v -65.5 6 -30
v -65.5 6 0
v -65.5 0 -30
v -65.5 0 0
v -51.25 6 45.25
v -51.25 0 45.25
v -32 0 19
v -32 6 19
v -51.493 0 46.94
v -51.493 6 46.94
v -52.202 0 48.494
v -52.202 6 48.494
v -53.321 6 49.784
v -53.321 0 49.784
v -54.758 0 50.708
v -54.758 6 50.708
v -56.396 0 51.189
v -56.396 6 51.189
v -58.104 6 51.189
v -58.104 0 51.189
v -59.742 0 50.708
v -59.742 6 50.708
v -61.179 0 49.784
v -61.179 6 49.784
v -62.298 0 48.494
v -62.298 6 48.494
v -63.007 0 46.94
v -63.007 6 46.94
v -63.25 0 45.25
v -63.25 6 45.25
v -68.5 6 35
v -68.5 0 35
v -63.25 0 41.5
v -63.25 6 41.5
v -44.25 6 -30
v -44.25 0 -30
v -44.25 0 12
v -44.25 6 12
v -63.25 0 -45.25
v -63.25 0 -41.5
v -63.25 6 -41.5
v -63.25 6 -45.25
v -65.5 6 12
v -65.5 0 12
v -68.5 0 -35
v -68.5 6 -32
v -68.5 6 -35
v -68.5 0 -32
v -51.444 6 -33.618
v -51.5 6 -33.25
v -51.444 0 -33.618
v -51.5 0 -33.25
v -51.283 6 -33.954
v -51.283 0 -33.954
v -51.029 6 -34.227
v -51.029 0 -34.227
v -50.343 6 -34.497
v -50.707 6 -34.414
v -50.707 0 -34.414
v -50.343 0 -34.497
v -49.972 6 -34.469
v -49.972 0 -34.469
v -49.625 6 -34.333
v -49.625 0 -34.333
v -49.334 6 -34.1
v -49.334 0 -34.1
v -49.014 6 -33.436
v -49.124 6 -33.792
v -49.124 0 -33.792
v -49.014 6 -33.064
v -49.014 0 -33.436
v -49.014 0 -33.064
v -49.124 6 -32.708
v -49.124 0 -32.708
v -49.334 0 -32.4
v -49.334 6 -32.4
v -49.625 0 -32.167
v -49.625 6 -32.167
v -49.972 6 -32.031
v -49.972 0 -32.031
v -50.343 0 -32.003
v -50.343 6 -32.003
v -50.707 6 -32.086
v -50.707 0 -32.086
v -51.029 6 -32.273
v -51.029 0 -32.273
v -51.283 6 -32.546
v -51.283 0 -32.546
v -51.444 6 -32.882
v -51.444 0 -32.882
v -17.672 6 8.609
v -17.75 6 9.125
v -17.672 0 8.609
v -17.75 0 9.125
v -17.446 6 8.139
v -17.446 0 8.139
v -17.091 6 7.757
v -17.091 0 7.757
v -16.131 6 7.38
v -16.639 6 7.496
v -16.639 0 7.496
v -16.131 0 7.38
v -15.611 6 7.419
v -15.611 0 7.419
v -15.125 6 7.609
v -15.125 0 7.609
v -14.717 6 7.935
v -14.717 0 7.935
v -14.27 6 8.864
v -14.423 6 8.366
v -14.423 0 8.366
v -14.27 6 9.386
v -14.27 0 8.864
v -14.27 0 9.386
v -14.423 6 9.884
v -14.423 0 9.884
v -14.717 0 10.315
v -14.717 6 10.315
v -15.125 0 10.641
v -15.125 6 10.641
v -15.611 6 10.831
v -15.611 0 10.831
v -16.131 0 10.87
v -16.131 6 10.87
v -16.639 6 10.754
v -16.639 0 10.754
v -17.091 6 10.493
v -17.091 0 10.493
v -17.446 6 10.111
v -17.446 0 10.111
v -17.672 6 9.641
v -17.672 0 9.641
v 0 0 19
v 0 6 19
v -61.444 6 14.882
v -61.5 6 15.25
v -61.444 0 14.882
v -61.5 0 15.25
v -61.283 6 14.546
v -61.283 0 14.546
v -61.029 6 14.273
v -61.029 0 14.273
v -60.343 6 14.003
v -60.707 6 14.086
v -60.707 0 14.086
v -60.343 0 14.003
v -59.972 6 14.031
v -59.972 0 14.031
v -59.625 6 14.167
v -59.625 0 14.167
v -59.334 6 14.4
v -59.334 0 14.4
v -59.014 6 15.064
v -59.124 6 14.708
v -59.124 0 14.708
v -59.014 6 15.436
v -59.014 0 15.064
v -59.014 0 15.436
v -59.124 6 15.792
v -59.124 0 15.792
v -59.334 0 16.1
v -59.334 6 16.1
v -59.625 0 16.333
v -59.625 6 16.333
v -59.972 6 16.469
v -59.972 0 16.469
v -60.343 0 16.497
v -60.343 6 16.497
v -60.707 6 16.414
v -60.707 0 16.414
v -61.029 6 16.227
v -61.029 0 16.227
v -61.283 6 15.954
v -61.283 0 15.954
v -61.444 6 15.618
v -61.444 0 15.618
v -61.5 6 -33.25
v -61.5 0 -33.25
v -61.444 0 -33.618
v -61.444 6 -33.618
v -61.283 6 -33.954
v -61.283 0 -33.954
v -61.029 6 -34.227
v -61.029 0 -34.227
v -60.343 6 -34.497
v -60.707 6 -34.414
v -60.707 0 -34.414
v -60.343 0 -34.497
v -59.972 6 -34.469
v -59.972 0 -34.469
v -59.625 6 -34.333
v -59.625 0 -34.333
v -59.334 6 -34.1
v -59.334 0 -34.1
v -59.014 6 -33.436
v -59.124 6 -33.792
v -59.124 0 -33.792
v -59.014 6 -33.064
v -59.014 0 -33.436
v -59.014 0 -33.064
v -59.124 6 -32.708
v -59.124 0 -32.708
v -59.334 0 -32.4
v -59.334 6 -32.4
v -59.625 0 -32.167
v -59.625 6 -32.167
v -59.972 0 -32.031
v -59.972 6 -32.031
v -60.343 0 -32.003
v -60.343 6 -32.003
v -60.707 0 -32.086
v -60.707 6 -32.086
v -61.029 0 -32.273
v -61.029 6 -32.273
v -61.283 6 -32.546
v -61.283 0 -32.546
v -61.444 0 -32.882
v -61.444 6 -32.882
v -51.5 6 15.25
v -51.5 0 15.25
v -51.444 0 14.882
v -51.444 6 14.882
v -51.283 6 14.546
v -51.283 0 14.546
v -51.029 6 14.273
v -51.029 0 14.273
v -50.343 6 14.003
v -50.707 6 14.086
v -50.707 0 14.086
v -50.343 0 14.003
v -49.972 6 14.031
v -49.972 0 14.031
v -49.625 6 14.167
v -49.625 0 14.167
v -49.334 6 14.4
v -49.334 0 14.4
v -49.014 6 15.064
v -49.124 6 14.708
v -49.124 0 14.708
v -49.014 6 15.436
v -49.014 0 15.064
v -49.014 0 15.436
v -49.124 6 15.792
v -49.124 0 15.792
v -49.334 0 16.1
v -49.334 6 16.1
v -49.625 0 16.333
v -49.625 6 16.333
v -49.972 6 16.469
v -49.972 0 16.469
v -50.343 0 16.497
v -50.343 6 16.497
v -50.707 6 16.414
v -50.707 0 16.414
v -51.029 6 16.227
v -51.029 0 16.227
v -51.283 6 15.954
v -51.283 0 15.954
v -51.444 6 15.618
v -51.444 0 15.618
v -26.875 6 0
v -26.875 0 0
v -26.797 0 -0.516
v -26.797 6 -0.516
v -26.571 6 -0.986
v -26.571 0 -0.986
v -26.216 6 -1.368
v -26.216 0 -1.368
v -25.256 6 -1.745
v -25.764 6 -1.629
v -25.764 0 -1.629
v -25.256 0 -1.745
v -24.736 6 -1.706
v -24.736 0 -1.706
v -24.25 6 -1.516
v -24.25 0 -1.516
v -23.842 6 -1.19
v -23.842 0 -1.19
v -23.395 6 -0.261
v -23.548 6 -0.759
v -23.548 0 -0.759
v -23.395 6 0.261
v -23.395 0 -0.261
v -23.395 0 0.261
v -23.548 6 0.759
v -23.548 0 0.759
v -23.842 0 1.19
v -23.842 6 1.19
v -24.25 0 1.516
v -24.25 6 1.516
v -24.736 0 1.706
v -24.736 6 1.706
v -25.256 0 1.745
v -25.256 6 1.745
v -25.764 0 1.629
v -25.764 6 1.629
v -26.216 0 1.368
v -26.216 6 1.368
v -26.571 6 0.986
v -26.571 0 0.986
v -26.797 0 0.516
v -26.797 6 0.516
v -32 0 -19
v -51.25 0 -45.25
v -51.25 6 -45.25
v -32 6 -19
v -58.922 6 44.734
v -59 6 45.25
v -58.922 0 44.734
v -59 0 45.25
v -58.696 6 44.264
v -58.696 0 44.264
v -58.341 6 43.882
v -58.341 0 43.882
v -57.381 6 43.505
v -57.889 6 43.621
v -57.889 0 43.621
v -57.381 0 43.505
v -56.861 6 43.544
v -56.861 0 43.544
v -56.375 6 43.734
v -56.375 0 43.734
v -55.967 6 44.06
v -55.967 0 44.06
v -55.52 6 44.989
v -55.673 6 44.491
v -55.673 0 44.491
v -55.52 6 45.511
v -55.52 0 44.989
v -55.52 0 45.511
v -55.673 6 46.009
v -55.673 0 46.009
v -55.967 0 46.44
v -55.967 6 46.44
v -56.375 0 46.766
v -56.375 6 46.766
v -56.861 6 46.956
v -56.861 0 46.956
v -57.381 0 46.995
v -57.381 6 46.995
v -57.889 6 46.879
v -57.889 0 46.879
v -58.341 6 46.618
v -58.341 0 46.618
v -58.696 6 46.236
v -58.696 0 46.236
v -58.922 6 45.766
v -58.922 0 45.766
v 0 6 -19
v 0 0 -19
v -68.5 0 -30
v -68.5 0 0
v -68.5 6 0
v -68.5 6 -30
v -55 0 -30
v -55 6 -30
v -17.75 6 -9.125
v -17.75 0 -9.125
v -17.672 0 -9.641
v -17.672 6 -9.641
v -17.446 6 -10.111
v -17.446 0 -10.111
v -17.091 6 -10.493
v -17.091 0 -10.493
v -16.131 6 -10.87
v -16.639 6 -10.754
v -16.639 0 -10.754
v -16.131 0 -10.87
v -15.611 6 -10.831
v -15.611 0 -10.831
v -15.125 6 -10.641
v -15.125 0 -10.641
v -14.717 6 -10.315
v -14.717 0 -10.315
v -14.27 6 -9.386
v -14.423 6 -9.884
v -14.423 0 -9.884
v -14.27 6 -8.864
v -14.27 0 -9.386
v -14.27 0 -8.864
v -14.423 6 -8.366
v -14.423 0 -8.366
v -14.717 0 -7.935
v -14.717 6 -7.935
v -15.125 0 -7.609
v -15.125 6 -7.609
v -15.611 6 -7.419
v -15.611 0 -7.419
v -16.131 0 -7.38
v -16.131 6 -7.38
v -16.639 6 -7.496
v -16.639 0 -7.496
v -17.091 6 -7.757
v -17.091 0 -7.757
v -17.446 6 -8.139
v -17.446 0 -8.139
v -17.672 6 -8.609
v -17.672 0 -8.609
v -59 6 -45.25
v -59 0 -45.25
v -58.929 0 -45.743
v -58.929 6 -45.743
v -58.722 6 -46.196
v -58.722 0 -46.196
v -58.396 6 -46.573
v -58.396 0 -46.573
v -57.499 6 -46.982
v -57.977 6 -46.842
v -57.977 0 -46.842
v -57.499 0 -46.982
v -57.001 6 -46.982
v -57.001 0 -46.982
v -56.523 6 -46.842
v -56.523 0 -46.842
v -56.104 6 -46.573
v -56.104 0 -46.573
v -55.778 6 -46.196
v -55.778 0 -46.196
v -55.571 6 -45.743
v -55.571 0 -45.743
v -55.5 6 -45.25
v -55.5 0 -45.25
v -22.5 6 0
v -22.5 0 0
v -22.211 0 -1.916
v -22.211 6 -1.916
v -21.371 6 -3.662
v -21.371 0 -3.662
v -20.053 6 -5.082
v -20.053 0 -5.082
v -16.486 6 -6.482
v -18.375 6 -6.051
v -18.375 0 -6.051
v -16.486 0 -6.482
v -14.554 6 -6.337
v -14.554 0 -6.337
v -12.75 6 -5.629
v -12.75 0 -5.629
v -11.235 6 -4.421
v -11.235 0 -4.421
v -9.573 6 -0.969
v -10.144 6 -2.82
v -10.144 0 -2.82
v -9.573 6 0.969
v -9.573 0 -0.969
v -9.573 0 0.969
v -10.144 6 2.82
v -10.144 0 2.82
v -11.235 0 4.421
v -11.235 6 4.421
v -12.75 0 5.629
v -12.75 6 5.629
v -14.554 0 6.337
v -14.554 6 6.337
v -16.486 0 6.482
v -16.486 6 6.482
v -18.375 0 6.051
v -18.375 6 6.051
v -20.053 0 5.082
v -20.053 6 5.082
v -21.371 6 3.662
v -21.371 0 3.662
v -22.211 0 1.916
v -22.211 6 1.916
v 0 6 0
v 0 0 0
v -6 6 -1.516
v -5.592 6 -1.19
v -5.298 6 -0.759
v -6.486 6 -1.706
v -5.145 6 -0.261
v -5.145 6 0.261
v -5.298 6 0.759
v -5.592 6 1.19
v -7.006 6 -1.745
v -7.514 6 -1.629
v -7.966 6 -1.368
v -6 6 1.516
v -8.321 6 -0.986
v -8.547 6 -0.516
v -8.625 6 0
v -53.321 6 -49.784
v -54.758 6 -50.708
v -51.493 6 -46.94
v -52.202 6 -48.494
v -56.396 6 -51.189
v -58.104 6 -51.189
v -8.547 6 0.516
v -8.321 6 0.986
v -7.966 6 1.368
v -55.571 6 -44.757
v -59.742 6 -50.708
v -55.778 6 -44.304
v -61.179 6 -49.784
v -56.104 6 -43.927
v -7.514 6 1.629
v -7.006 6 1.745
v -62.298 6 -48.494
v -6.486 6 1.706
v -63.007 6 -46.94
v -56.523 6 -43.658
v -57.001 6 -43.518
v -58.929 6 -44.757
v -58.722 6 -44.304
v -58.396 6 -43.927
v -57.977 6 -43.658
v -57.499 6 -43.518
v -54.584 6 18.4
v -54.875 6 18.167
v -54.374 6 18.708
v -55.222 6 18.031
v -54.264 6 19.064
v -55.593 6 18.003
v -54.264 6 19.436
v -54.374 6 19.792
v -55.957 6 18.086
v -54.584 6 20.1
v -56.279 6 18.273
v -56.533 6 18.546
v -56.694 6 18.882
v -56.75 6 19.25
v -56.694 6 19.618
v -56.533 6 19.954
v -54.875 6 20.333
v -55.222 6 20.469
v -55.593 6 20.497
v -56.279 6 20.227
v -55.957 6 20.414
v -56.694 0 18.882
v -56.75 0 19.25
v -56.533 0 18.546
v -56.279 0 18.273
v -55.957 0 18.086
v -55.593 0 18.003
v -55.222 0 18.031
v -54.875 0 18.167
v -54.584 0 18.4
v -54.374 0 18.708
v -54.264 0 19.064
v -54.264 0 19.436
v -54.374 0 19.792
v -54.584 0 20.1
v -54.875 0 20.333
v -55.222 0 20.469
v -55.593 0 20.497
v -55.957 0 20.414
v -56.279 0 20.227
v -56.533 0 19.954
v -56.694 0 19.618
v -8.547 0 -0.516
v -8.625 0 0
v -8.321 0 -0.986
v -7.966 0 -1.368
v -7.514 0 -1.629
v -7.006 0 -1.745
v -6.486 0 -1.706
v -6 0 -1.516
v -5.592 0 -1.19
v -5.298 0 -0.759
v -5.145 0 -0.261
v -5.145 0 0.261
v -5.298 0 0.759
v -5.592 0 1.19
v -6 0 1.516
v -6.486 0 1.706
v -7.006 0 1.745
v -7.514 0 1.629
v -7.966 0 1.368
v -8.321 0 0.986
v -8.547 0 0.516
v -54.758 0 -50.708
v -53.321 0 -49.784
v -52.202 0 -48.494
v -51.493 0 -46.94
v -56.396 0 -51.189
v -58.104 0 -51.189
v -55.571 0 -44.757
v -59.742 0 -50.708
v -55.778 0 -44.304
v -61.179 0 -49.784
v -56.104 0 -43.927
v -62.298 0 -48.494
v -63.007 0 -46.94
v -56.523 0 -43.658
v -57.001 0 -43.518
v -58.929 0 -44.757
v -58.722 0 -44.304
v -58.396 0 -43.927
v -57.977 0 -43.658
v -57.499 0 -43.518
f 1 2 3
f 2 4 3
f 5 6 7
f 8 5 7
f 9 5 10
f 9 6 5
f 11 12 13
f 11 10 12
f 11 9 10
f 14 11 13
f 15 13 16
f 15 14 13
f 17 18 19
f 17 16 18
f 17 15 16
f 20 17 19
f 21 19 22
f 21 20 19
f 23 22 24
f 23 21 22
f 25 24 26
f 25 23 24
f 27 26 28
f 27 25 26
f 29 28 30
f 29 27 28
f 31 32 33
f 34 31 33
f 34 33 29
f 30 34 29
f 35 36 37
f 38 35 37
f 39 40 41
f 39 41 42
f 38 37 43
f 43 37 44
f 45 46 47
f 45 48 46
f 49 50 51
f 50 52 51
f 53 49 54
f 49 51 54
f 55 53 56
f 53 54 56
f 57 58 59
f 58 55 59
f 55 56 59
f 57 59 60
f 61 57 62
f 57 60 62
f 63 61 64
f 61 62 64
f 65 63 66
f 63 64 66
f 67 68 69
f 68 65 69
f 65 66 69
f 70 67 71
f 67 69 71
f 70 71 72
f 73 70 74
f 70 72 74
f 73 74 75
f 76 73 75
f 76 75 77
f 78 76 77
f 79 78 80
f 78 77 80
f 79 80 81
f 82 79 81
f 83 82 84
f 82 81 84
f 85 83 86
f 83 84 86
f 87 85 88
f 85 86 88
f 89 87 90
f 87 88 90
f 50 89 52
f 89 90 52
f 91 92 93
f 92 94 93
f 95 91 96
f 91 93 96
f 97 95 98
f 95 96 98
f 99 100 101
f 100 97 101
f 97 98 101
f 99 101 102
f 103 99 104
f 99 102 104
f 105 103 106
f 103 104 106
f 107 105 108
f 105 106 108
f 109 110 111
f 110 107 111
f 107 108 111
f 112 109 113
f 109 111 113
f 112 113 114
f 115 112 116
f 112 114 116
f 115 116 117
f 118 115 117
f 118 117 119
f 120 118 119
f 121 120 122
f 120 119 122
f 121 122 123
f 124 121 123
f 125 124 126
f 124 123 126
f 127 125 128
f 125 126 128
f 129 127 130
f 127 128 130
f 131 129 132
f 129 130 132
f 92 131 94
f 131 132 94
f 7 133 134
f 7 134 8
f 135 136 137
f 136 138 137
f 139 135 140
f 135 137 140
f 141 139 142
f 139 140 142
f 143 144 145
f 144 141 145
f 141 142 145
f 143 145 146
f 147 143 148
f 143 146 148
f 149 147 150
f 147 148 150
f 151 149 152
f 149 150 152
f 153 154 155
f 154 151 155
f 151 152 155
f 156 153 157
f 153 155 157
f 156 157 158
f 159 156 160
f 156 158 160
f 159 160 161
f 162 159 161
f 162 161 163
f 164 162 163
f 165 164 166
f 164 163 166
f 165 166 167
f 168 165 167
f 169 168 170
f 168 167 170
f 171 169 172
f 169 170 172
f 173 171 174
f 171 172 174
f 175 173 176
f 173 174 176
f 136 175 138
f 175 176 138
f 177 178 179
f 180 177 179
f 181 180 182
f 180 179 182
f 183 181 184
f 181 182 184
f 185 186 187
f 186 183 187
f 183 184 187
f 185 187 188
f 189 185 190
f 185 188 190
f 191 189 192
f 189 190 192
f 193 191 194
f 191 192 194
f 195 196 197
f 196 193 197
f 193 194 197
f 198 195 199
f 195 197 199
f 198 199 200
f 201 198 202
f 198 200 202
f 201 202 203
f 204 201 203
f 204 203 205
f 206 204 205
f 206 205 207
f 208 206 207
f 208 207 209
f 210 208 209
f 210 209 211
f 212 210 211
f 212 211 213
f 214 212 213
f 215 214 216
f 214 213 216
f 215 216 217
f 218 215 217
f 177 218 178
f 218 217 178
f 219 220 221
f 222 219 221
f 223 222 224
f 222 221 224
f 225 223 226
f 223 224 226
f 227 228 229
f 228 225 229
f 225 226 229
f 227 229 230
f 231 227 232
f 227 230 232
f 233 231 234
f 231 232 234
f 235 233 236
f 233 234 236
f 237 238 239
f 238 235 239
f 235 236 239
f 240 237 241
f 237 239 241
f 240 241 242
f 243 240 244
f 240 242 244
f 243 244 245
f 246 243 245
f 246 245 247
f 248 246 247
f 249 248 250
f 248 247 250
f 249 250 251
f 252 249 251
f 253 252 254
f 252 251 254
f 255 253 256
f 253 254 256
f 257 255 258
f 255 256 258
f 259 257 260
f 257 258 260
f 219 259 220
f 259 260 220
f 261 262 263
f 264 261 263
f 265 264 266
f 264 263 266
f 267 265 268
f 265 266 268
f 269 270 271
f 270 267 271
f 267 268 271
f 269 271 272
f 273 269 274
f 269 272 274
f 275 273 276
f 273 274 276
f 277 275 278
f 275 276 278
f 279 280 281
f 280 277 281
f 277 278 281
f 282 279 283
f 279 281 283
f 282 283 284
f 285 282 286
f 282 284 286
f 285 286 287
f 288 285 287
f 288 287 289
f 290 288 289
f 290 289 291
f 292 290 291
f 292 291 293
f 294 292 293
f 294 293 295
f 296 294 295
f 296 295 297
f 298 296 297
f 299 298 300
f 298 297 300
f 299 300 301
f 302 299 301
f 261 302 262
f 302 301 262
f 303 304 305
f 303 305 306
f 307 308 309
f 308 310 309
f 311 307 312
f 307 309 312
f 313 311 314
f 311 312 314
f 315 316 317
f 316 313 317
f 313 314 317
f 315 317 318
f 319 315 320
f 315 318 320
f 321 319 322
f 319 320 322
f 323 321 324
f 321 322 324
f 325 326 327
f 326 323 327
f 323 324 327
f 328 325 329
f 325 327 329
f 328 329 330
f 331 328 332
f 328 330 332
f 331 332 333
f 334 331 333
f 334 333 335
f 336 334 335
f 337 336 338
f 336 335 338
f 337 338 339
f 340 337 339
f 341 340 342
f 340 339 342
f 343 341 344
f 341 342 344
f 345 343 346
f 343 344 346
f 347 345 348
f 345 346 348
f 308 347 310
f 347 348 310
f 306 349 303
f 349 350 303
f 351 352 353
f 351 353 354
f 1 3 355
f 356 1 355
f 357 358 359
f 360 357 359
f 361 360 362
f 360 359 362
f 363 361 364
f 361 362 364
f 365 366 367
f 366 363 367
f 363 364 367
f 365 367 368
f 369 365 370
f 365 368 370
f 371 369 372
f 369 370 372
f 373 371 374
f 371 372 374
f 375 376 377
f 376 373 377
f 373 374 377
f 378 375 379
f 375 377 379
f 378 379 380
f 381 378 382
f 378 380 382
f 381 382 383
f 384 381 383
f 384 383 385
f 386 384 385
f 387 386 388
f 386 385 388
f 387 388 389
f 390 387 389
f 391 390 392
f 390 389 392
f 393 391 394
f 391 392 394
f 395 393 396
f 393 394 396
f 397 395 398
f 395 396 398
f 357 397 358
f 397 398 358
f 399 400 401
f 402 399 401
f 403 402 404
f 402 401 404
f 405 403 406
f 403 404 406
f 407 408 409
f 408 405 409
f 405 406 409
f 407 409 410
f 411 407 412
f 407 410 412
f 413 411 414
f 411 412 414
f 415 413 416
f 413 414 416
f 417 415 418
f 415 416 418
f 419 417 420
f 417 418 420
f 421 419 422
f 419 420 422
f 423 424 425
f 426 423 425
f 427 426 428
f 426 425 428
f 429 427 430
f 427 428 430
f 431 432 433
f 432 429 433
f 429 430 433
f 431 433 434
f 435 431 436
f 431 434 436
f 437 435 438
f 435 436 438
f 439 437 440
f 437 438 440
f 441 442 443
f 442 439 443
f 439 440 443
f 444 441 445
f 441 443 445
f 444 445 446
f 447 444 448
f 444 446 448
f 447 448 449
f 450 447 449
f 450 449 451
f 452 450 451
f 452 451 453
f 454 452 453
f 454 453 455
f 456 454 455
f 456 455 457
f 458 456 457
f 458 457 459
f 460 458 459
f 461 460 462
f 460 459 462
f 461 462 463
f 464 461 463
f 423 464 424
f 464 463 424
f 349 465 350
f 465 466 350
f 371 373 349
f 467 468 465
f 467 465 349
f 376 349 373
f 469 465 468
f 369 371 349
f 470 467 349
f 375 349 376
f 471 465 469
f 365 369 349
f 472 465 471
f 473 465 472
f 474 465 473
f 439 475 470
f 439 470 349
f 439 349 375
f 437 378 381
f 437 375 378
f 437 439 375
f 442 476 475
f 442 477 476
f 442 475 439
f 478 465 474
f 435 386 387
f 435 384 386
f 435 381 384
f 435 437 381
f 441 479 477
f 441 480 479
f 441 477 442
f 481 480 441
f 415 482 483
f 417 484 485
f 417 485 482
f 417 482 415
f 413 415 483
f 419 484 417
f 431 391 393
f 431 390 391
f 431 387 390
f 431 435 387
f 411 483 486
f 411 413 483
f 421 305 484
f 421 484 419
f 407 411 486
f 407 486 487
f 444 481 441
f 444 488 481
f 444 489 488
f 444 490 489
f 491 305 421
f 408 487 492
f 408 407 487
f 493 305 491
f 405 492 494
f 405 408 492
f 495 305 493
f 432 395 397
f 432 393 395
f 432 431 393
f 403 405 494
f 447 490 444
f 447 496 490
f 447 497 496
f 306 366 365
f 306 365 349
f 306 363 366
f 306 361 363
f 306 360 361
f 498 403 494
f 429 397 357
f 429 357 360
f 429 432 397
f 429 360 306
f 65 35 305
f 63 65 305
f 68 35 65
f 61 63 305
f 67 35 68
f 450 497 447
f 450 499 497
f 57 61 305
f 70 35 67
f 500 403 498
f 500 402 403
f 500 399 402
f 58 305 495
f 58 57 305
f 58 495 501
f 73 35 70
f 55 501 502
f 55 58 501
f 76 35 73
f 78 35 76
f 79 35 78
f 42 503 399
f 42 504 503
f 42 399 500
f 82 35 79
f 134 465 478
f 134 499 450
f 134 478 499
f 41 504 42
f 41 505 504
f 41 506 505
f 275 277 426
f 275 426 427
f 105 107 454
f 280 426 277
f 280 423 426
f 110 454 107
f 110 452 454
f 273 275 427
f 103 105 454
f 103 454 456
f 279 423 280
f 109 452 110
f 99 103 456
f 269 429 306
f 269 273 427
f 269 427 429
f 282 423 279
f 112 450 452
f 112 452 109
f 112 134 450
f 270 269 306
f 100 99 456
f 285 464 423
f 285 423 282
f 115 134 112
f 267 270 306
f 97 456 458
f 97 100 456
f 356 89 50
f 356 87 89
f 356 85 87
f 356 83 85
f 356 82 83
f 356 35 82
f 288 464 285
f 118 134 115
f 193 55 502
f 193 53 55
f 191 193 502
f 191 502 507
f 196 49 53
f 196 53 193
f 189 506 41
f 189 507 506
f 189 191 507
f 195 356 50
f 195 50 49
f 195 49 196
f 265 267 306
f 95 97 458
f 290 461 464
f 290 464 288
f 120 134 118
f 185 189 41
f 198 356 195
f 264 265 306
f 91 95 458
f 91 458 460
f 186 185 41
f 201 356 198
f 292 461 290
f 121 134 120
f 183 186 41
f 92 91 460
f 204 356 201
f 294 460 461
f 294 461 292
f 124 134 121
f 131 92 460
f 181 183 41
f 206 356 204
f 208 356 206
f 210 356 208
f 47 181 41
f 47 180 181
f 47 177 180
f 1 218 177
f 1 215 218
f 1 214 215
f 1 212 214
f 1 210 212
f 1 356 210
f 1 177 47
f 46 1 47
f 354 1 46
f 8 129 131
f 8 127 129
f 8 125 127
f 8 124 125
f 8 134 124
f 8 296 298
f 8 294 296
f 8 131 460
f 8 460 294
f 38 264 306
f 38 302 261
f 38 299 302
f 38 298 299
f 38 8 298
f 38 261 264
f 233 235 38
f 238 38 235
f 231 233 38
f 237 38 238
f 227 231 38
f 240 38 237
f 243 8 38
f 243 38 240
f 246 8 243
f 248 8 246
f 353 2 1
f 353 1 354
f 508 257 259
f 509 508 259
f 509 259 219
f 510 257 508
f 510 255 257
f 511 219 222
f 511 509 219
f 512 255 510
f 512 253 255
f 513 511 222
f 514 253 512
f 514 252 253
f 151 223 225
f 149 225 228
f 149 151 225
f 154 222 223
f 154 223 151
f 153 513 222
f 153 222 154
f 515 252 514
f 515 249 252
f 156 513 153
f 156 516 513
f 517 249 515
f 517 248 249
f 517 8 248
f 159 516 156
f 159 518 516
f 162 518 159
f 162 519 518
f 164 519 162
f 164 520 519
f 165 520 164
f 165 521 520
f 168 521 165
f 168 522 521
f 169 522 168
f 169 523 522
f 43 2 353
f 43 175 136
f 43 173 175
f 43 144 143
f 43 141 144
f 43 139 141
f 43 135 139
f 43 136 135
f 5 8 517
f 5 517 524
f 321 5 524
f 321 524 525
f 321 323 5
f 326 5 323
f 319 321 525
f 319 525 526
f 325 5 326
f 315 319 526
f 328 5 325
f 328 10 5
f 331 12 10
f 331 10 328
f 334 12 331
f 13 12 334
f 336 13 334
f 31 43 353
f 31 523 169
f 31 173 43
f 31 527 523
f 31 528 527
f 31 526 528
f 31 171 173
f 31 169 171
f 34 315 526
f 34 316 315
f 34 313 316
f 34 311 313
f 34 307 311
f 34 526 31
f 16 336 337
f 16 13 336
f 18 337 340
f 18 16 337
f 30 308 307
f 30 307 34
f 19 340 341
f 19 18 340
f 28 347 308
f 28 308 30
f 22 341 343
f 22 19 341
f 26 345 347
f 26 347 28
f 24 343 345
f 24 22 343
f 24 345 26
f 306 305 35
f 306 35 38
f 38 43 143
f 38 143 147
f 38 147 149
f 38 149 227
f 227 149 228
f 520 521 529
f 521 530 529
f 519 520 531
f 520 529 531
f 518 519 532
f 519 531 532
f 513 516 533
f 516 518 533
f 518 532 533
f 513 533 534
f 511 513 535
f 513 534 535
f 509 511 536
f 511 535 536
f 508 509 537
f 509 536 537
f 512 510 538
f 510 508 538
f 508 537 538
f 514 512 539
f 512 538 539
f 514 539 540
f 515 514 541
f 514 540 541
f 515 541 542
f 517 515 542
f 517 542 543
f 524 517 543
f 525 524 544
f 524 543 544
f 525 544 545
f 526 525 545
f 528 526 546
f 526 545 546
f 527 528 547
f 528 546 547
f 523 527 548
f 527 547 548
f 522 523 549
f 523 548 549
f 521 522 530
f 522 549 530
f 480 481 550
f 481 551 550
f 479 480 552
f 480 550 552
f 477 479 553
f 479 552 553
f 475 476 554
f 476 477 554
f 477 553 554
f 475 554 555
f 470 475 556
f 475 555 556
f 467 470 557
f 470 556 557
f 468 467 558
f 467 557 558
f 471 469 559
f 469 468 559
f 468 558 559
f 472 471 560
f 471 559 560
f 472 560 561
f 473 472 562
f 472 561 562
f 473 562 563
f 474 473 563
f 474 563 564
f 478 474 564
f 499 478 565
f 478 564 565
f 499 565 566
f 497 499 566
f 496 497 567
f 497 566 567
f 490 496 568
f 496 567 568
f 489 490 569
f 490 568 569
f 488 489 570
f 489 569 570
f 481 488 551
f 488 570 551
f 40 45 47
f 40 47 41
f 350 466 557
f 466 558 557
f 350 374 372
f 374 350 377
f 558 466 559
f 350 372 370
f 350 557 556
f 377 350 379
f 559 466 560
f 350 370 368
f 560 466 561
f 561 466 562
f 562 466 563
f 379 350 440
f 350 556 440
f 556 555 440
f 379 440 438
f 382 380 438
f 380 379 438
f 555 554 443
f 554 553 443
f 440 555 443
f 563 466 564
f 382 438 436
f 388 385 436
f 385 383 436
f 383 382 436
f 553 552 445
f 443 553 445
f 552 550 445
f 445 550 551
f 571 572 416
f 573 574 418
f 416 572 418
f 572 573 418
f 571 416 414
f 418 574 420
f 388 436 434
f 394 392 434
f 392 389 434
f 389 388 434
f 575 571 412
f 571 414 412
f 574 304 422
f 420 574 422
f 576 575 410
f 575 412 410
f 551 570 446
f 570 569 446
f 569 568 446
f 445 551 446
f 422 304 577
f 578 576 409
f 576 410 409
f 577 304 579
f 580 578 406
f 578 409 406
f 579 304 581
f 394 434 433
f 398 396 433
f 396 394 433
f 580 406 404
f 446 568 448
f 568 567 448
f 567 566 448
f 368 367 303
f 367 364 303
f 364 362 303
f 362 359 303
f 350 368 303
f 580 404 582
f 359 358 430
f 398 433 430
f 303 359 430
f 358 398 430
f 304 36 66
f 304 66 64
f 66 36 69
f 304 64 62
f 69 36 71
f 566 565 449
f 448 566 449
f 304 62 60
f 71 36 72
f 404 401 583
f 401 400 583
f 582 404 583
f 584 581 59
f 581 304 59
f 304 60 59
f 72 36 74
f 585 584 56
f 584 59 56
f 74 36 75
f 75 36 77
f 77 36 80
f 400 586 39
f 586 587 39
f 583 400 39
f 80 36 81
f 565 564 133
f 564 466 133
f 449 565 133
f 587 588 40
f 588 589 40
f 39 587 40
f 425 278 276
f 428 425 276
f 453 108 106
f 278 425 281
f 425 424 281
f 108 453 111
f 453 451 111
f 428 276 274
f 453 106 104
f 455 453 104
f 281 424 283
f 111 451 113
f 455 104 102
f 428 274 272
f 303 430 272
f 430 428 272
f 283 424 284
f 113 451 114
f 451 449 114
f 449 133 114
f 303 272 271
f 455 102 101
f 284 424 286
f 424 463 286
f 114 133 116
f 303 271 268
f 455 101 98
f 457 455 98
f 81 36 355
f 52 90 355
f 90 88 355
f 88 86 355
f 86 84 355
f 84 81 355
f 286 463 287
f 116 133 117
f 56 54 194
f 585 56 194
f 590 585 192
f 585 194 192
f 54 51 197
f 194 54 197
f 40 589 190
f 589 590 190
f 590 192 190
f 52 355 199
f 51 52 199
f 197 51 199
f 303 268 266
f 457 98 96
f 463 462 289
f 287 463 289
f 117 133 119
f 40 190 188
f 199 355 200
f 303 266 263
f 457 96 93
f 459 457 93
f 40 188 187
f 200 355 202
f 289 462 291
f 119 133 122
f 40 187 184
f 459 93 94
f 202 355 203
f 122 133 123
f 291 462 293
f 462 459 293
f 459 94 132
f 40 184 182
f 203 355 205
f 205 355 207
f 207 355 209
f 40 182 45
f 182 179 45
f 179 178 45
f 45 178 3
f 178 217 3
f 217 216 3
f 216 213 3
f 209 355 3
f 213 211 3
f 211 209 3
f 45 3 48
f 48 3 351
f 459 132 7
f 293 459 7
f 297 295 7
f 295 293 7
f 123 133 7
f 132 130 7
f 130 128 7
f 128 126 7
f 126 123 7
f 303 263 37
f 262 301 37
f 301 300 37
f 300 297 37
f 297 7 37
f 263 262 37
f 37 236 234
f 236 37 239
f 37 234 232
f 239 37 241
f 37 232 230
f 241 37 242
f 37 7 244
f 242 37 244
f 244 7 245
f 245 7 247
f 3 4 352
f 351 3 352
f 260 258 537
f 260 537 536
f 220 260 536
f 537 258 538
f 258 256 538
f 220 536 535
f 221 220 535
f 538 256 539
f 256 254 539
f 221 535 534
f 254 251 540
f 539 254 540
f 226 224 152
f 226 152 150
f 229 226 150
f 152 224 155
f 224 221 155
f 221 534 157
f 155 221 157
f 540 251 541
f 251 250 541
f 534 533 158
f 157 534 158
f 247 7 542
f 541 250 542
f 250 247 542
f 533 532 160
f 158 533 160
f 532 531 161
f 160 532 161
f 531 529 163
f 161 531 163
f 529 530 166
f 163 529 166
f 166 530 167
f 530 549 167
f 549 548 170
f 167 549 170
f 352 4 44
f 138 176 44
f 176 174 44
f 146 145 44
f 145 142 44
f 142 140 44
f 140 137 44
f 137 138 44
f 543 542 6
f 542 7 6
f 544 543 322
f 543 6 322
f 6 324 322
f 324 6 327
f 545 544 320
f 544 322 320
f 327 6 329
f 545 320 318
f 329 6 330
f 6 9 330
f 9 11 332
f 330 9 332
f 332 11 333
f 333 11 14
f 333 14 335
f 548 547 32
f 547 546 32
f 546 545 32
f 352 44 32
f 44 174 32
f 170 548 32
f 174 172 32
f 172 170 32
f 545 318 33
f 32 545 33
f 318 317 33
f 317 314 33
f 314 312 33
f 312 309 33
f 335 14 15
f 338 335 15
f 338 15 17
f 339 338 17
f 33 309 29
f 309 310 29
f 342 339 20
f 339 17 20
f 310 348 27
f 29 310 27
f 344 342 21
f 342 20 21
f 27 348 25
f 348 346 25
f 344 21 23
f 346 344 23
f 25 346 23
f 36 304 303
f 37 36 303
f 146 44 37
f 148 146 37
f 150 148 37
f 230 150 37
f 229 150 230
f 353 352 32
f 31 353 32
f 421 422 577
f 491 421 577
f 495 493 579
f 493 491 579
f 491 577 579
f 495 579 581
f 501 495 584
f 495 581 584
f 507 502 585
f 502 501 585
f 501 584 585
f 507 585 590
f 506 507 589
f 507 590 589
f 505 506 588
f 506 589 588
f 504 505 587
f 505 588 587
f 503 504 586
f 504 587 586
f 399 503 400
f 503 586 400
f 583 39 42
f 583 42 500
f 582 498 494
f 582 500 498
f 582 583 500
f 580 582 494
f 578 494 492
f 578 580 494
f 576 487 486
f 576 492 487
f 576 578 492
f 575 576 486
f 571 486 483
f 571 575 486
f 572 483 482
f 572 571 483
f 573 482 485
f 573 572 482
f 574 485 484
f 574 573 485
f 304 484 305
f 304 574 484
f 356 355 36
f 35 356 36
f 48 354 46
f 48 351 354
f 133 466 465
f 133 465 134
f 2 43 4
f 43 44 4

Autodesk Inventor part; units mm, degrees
ref_plane "YZ Plane" through (0, 0, 0) normal (1, 0, 0) x (0, 1, 0)
ref_plane "XZ Plane" through (0, 0, 0) normal (0, 1, 0) x (-1, 0, 0)
ref_plane "XY Plane" through (0, 0, 0) normal (0, 0, 1) x (1, 0, 0)
sketch "Sketch1" plane through (0, 0, 0) normal (0, 1, 0) x (-1, 0, 0)
  line L0 (0, 0) -> (0, -19)
  line L1 (0, 0) -> (0, 19)
  line L2 (0, 0) -> (19, 0) construction
  line L3 (0, 19) -> (32, 19)
  line L4 (0, -19) -> (32, -19)
  line L5 (68.5, 0) -> (68.5, -35)
  line L6 (68.5, 0) -> (68.5, 35)
  circle A0 centre (16, 0) radius 6.5
  circle A1 centre (25.125, 0) radius 1.75
  line L7 (55, -30) -> (44.25, -30)
  line L8 (44.25, -30) -> (44.25, 12)
  line L9 (44.25, 12) -> (65.5, 12)
  line L10 (65.5, 12) -> (65.5, 0)
  line L11 (65.5, 0) -> (65.5, -30)
  line L12 (65.5, -30) -> (55, -30)
  line L13 (68.5, -30) -> (68.5, -32)
  circle A2 centre (60.25, -33.25) radius 1.25
  circle A3 centre (50.25, -33.25) radius 1.25
  circle A4 centre (60.25, 15.25) radius 1.25
  circle A5 centre (50.25, 15.25) radius 1.25
  circle A6 centre (16, 9.125) radius 1.75
  circle A7 centre (6.875, 0) radius 1.75
  circle A8 centre (16, -9.125) radius 1.75
  line L14 (68.5, 0) -> (65.5, 0)
  circle A9 centre (57.25, -45.25) radius 1.75
  line L15 (55.5, -45.25) -> (49.3011, -45.25)
  arc A10 (51.25, -45.25) -> (63.25, -45.25) centre (57.25, -45.25) ccw
  line L16 (51.25, -45.25) -> (32, -19)
  line L17 (63.25, -41.5) -> (63.25, -45.25)
  line L18 (68.5, -35) -> (63.25, -41.5)
  circle A11 centre (57.25, 45.25) radius 1.75
  arc A12 (63.25, 45.25) -> (51.25, 45.25) centre (57.25, 45.25) ccw
  line L19 (51.25, 45.25) -> (32, 19)
  line L20 (63.25, 41.5) -> (63.25, 45.25)
  line L21 (68.5, 35) -> (63.25, 41.5)
  circle A13 centre (55.5, 19.25) radius 1.25
  dimension "d0" = 19
  dimension "d1" = 19
  dimension "d2" = 90
  dimension "d3" = 32
  dimension "d4" = 68.5
  dimension "d5" = 35
  dimension "d8" = 13
  dimension "d10" = 3.5
  dimension "d18" = 10.75
  dimension "d22" = 2.5
  dimension "d30" = 360
  dimension "d35" = 12
extrude "Extrusion1" add sketch "Sketch1" along normal blind 6
properties part number "Claw_Main"
